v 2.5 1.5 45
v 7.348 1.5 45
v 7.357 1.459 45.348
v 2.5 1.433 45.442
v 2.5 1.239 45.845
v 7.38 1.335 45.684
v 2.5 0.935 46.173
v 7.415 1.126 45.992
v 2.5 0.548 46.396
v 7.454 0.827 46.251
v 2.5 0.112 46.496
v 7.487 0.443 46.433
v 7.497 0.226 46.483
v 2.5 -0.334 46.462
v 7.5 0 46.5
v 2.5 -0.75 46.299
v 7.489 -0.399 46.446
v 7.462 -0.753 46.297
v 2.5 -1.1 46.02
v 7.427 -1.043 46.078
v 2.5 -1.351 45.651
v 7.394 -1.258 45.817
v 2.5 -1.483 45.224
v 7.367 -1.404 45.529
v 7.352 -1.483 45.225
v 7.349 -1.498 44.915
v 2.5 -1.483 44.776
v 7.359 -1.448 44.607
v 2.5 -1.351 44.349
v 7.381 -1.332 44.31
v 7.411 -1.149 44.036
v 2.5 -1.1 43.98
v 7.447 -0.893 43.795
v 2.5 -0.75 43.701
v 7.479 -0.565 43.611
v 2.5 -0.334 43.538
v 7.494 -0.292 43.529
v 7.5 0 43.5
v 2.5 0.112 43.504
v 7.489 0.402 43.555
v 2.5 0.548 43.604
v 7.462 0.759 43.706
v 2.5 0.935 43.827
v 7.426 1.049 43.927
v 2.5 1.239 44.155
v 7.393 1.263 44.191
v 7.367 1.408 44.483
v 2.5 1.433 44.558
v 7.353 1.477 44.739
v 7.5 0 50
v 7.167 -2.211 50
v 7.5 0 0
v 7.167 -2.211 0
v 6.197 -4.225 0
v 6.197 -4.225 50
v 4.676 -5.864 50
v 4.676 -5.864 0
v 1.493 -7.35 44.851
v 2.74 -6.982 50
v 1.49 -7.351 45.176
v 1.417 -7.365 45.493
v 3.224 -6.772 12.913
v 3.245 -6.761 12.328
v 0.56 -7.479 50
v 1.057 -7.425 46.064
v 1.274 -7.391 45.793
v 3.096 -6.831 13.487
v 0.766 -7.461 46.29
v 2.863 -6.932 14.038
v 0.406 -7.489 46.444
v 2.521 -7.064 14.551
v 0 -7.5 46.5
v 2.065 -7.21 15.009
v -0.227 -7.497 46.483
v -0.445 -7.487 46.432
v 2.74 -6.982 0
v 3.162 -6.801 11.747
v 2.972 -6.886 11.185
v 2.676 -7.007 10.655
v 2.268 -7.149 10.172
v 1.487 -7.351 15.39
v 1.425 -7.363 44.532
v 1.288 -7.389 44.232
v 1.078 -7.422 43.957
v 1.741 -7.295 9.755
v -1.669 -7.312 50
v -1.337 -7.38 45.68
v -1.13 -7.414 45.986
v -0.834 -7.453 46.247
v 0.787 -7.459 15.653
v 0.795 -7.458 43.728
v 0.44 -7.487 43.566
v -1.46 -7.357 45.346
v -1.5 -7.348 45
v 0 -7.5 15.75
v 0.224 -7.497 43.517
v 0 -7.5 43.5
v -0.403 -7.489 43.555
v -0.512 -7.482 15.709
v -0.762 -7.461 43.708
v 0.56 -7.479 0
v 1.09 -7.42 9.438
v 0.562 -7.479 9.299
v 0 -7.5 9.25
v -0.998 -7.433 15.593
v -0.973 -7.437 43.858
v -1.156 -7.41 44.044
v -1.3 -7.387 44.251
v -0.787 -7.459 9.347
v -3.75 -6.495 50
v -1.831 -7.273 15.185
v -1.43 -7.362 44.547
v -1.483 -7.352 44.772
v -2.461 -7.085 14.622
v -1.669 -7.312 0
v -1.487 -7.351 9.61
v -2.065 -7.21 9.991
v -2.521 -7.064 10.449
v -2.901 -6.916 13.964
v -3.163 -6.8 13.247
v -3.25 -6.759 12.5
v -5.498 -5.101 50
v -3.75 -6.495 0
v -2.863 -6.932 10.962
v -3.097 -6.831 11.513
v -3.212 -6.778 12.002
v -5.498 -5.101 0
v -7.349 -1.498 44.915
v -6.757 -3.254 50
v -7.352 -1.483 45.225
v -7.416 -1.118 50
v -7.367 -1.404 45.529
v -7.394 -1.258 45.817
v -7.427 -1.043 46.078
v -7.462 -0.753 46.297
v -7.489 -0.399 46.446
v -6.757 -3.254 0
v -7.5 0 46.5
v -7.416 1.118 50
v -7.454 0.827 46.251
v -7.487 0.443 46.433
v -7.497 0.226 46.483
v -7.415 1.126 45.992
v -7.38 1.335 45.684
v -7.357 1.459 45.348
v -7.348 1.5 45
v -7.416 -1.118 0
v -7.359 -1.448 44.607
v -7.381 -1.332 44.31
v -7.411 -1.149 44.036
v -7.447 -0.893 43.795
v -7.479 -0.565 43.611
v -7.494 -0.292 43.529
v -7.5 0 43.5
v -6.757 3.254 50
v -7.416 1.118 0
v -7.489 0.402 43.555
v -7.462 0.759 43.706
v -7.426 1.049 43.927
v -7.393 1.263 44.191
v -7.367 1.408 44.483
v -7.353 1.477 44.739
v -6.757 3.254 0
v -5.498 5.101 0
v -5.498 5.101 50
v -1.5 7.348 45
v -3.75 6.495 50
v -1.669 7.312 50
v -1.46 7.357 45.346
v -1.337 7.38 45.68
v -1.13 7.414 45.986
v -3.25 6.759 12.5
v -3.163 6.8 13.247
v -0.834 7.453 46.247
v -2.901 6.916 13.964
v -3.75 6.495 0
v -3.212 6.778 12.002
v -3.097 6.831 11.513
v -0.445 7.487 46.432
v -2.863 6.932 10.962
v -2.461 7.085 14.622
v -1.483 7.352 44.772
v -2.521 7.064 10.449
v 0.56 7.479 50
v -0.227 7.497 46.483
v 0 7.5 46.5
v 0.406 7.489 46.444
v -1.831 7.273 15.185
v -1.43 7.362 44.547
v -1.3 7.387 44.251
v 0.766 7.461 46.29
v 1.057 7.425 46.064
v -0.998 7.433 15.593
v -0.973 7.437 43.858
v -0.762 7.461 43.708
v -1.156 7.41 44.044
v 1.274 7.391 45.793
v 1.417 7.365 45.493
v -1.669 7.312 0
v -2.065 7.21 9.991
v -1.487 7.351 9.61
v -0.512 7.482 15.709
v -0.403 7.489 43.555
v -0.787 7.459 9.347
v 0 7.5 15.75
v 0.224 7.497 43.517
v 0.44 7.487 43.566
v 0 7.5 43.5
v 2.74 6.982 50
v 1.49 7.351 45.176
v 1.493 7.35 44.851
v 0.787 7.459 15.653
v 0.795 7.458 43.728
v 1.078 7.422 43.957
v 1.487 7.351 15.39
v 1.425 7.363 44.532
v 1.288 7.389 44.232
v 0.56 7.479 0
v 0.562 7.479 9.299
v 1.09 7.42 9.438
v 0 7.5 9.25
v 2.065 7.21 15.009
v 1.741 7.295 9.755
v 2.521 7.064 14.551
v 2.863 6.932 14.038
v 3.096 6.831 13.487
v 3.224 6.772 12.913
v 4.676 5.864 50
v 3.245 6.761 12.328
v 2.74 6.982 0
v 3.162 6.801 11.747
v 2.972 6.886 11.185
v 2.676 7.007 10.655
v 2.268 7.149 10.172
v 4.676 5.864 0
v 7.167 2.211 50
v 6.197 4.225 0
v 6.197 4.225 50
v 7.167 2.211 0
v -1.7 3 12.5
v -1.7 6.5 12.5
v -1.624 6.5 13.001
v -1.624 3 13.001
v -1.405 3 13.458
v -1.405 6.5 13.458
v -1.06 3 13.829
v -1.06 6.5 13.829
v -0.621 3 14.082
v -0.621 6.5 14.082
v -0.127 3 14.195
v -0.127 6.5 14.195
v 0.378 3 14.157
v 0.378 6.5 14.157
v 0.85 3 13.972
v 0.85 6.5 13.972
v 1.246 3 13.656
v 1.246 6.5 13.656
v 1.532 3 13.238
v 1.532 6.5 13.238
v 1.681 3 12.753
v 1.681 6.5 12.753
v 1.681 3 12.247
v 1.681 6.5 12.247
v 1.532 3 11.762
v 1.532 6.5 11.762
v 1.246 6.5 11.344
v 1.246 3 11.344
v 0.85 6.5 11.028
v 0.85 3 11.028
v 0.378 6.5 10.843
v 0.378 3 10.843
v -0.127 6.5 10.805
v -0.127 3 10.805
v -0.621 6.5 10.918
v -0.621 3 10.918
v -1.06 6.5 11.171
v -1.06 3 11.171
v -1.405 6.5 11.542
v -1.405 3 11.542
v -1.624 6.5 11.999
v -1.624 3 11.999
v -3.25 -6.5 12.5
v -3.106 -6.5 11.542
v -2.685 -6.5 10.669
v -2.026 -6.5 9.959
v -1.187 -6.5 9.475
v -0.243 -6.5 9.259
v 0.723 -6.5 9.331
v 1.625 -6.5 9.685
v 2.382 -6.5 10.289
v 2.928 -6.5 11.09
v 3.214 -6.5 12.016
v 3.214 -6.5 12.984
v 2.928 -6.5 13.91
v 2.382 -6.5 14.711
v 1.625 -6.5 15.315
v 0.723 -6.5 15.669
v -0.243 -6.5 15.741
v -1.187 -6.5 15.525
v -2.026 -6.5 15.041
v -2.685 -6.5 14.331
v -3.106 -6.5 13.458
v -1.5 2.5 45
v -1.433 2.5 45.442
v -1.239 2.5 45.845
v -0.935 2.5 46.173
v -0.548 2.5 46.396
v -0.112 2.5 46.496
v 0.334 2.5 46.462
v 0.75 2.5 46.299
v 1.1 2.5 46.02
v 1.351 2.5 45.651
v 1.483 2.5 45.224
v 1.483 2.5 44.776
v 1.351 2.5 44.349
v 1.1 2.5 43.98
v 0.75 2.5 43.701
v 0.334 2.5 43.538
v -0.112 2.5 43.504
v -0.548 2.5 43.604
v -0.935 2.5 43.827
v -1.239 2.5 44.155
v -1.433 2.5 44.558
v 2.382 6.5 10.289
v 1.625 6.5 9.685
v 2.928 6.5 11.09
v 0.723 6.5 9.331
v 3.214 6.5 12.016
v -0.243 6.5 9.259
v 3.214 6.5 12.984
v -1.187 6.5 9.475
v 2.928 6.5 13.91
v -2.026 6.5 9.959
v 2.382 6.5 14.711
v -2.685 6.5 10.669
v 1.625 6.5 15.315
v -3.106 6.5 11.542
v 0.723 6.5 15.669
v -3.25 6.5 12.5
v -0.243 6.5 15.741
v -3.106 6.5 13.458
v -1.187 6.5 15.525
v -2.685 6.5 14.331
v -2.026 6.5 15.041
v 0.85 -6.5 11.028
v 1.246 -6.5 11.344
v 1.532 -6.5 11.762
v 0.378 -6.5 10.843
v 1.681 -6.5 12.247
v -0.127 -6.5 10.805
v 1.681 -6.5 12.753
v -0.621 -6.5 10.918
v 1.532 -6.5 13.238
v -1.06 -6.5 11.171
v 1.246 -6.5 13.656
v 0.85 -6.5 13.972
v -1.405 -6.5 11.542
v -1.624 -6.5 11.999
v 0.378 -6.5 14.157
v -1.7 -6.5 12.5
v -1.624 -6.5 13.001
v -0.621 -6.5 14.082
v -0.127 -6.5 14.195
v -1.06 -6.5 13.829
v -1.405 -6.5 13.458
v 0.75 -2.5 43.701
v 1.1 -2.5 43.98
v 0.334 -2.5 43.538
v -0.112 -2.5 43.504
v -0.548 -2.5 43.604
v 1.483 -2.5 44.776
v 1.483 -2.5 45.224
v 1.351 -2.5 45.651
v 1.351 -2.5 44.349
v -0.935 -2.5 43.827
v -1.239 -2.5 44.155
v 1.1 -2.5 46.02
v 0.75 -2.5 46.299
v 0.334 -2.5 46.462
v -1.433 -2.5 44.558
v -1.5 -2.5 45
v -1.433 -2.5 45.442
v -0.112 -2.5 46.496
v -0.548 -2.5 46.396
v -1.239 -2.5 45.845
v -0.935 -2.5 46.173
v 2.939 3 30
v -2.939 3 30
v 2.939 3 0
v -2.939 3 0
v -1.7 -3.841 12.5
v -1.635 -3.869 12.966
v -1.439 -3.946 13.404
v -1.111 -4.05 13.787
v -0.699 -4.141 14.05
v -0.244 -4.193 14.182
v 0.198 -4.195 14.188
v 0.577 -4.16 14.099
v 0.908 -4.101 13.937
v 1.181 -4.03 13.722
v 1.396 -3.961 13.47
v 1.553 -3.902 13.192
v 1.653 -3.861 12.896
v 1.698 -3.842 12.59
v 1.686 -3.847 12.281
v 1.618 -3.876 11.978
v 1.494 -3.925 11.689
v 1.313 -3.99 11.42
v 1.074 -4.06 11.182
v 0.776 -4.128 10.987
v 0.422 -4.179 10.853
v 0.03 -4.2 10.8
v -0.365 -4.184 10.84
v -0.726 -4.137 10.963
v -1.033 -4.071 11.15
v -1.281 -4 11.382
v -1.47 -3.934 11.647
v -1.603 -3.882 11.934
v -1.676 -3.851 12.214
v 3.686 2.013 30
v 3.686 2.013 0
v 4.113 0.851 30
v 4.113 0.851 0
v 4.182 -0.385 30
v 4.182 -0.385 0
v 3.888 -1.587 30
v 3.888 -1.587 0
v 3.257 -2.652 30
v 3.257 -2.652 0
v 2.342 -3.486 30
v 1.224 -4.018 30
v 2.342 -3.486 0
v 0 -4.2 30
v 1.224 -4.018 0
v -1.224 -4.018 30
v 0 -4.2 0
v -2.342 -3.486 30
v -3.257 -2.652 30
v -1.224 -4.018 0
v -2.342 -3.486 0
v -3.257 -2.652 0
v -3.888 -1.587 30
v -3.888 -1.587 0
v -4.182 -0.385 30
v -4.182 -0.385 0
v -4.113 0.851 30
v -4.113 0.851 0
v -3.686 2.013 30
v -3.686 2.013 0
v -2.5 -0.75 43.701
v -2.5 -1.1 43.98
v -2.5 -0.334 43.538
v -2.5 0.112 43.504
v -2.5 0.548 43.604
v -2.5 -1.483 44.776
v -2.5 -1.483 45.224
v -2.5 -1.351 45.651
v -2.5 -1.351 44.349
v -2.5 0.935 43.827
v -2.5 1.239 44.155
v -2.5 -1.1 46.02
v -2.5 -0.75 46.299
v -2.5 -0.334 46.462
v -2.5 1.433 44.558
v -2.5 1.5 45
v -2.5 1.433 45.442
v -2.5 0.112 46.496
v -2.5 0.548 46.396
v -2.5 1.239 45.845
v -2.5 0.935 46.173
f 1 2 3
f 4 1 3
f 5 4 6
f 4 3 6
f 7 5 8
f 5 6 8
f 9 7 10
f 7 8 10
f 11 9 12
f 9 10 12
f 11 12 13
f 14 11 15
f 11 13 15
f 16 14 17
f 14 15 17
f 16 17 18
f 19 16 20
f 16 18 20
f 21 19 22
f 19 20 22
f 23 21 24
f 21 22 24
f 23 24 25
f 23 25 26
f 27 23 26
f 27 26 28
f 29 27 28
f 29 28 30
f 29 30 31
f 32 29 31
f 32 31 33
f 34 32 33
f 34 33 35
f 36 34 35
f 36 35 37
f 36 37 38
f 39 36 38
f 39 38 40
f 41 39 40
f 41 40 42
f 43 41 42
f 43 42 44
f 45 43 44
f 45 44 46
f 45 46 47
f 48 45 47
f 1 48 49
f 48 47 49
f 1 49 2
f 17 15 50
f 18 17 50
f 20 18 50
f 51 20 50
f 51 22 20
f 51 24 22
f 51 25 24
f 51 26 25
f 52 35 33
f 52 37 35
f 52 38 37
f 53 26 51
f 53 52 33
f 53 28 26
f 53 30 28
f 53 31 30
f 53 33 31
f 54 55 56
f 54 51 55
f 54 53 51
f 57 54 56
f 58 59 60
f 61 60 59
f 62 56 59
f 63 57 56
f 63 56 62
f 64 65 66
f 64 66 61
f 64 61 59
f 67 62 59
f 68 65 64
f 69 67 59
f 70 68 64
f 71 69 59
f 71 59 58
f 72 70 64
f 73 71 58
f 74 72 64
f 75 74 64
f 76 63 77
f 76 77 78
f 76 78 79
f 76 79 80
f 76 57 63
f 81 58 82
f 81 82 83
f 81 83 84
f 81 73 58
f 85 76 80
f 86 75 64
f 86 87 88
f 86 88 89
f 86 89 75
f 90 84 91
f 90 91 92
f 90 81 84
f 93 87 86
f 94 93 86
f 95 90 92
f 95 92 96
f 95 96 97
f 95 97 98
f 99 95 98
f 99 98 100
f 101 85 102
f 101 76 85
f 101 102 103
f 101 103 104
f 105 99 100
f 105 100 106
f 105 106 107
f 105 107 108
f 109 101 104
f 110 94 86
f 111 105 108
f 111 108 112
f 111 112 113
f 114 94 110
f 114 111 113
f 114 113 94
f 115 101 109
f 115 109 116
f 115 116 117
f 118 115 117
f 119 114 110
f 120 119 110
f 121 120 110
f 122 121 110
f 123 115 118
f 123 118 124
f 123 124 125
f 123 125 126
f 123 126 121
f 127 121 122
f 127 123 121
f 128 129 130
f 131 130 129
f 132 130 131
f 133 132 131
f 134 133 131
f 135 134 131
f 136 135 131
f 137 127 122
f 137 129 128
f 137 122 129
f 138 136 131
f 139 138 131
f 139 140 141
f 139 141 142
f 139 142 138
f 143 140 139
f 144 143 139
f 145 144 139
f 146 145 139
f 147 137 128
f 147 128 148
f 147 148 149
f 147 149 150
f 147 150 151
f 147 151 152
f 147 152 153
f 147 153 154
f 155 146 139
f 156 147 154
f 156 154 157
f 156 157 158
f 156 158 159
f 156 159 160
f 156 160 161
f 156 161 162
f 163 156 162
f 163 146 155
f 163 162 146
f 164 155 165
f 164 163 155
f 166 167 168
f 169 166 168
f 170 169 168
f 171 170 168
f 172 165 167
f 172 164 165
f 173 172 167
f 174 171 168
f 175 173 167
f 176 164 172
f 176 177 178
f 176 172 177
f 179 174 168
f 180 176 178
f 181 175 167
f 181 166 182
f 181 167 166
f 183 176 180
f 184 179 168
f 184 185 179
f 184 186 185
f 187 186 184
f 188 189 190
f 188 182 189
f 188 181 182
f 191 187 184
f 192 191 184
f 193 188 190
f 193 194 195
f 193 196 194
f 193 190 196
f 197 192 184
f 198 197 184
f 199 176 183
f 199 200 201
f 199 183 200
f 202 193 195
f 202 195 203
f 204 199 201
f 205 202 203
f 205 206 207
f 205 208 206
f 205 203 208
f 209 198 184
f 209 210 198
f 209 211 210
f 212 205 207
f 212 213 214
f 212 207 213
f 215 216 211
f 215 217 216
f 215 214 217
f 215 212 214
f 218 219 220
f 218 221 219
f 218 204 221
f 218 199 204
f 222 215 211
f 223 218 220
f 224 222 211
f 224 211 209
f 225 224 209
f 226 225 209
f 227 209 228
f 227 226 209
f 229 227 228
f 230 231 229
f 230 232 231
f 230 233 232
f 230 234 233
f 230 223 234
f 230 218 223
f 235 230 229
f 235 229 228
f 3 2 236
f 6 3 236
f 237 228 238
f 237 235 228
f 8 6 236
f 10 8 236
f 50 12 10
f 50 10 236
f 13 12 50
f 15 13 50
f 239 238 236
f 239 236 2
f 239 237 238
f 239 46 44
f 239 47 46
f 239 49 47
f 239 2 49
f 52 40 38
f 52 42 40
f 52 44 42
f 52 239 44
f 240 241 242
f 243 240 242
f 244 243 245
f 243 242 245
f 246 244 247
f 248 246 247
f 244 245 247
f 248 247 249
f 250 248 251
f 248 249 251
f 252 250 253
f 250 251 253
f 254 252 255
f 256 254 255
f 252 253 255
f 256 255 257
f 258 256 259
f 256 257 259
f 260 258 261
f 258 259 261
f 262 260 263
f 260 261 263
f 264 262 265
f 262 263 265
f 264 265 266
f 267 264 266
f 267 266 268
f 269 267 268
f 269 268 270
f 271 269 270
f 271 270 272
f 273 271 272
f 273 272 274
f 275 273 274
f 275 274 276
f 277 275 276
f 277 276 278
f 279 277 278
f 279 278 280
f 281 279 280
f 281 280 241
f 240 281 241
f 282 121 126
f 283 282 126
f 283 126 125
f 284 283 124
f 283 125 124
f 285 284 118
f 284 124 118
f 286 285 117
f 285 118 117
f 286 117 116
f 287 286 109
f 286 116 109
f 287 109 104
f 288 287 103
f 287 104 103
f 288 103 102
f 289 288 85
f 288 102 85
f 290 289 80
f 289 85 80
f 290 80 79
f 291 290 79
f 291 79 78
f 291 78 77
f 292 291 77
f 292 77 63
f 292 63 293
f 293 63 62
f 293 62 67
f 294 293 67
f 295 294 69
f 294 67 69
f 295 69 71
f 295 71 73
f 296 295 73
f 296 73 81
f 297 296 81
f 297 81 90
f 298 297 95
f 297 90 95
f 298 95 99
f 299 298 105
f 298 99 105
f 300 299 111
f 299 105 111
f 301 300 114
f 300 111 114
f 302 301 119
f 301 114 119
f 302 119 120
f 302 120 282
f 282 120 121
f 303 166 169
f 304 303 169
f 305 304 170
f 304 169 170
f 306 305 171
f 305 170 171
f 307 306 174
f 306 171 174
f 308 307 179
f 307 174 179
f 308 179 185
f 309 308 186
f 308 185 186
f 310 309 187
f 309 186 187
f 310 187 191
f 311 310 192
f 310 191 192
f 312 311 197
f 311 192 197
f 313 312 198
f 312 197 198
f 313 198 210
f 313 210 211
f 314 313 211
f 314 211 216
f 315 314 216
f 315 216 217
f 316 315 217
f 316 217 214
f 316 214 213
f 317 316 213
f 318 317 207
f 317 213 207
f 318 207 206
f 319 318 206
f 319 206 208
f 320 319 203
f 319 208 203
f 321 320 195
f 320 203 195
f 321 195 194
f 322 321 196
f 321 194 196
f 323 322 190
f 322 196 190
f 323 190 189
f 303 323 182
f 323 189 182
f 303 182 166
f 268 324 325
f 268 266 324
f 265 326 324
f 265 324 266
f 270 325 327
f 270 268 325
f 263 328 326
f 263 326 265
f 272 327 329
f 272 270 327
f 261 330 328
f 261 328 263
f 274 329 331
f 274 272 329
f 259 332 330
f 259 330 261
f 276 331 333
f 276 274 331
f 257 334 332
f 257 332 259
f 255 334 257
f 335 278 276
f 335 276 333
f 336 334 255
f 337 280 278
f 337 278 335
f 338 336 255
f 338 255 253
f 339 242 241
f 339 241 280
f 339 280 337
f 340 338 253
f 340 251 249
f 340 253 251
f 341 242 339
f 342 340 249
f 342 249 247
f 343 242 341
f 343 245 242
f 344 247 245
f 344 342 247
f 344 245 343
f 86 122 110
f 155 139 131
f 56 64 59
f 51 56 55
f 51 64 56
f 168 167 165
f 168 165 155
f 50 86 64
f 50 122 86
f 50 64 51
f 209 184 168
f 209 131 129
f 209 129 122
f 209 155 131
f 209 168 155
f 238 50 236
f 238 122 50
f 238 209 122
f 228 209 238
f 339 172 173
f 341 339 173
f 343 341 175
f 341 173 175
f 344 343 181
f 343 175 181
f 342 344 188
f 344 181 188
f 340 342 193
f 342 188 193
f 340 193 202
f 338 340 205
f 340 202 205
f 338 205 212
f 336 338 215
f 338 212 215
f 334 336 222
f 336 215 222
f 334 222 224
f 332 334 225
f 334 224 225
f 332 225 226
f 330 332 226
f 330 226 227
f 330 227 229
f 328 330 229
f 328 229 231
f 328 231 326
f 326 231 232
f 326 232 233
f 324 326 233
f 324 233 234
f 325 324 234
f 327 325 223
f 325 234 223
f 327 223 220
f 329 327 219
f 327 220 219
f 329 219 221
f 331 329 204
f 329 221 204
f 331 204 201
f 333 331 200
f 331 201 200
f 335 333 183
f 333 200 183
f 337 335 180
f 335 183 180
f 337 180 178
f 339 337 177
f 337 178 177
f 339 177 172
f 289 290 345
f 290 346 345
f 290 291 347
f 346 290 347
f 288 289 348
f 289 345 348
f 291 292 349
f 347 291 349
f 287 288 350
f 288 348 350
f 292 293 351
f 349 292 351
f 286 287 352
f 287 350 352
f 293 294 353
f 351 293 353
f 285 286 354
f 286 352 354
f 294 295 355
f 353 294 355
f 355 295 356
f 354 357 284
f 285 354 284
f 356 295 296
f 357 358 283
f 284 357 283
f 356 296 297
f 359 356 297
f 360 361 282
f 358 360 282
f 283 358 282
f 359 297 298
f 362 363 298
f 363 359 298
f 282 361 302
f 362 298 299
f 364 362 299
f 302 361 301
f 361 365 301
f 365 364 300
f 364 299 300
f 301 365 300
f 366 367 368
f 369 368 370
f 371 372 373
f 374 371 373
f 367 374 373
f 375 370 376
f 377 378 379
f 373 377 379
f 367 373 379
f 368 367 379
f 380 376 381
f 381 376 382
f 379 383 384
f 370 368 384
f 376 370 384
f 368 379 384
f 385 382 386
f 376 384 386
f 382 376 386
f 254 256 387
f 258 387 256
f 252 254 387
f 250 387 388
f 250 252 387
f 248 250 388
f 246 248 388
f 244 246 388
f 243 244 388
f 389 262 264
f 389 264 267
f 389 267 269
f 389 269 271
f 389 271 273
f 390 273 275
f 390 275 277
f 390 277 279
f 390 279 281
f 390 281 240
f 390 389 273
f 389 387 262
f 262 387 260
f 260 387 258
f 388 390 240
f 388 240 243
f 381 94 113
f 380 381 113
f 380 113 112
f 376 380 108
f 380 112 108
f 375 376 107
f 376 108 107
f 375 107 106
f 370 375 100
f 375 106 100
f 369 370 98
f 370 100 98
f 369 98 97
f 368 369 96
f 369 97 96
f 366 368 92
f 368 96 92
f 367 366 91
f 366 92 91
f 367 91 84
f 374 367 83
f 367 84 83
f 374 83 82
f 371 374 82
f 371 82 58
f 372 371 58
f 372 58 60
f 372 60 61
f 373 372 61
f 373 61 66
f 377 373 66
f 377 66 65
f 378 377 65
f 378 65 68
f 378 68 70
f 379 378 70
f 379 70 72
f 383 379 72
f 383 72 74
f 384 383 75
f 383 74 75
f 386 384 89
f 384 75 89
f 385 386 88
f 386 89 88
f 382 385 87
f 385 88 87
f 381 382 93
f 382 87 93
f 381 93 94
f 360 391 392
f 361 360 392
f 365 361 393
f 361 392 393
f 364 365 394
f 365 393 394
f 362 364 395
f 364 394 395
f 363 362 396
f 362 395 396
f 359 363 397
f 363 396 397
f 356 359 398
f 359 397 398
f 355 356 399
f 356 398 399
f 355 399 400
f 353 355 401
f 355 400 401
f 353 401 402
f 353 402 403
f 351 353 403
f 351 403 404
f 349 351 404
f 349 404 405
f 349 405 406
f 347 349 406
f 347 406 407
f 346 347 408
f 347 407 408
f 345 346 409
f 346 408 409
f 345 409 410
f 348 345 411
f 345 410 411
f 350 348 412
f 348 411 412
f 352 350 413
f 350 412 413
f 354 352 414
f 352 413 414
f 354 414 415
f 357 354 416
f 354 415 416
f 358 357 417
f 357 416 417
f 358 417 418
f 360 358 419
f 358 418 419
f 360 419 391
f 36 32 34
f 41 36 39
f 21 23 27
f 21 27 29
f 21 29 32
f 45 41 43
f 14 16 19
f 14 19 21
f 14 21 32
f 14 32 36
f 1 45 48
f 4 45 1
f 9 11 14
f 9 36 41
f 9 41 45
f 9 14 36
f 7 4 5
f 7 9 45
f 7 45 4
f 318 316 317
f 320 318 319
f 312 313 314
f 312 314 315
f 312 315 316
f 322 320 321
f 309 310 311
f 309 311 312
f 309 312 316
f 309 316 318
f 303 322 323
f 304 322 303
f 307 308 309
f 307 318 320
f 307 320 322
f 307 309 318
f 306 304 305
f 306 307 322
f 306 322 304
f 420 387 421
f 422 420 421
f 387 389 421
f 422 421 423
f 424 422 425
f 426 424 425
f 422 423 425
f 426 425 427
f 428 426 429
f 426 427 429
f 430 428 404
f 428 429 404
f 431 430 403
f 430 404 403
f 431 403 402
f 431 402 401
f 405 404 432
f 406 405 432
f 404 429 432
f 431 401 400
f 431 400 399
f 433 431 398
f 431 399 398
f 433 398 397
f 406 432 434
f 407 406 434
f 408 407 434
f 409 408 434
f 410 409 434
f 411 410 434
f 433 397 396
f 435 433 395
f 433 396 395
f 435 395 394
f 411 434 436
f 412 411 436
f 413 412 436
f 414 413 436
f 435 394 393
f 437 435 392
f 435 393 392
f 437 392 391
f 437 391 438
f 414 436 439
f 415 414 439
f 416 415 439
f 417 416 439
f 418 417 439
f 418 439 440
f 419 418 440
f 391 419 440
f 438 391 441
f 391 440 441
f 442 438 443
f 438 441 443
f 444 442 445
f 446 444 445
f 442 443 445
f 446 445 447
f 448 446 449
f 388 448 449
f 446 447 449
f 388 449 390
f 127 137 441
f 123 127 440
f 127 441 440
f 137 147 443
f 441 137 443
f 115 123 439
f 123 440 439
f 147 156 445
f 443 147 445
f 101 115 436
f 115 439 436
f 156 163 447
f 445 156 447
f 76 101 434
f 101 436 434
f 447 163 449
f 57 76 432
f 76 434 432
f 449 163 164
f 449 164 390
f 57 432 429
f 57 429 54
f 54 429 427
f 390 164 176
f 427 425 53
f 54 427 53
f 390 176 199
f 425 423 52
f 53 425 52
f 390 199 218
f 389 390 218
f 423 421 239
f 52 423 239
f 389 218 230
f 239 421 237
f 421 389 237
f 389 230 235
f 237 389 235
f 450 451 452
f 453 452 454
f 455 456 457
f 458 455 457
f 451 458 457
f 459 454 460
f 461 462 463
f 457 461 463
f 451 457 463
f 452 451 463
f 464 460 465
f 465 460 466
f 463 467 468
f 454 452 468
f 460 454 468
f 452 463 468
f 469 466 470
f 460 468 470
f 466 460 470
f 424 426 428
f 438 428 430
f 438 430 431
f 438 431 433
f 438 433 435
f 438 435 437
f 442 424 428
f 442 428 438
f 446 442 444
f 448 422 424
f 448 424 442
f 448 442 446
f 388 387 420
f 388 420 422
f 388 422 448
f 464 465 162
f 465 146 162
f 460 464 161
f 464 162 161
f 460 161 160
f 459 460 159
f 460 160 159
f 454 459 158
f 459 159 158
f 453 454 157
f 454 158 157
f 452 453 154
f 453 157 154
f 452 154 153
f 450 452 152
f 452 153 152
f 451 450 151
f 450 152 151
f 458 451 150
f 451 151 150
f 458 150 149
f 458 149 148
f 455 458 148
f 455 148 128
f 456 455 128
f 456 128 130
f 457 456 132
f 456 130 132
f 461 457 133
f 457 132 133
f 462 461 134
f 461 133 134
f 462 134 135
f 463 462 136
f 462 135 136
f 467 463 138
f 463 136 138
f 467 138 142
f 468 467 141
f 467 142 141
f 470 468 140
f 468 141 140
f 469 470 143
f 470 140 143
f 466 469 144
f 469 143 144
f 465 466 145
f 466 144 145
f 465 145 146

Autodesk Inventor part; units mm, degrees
sketch "スケッチ1" plane through (0, 0, 0) normal (0, 0, 1) x (1, 0, 0)
  circle A0 centre (0, 0) radius 7.5
  dimension "d0" = 15
extrude "押し出し1" add sketch "スケッチ1" along normal blind 50
sketch "スケッチ2" plane through (0, 0, 0) normal (0, 0, -1) x (-1, 0, 0)
  arc A0 (-2.9394, 3) -> (2.9394, 3) centre (0, 0) ccw
  line L0 (-2.9394, 3) -> (2.9394, 3)
  point P0 (-3.1305, 2.8)
  dimension "d3" = 4.2
  dimension "d4" = 3
extrude "押し出し2" cut sketch "スケッチ2" against normal blind 30
ref_plane "作業平面1" through (7.5, 0, 0) normal (1, 0, 0) x (0, 1, 0)
ref_plane "作業平面2" through (-7.5, 0, 0) normal (1, 0, 0) x (0, 1, 0)
ref_plane "作業平面3" through (0, 7.5, 0) normal (0, 1, 0) x (-1, 0, 0)
ref_plane "作業平面4" through (0, -7.5, 0) normal (0, 1, 0) x (-1, 0, 0)
sketch "スケッチ3" plane through (7.5, 0, 0) normal (1, 0, 0) x (0, 1, 0)
  circle A0 centre (0, 45) radius 1.5
  line L0 (7.5, 50) -> (-7.5, 50) projected
  point P0 (0, 0)
  dimension "d11" = 3
  dimension "d12" = 5
sketch "スケッチ4" plane through (-7.5, 0, 0) normal (1, 0, 0) x (0, 1, 0)
  circle A0 centre (0, 45) radius 1.5
  line L0 (7.5, 50) -> (-7.5, 50) projected
  point P0 (0, 0)
  dimension "d13" = 3
  dimension "d14" = 5
extrude "押し出し3" cut sketch "スケッチ3" against normal blind 5
extrude "押し出し4" cut sketch "スケッチ4" along normal blind 5
sketch "スケッチ5" plane through (0, 7.5, 0) normal (0, 1, 0) x (-1, 0, 0)
  circle A0 centre (0, 45) radius 1.5
  line L0 (7.5, 50) -> (-7.5, 50) projected
  point P0 (0, 0)
  dimension "d19" = 3
  dimension "d20" = 5
sketch "スケッチ6" plane through (0, -7.5, 0) normal (0, 1, 0) x (-1, 0, 0)
  circle A0 centre (0, 45) radius 1.5
  line L0 (7.5, 50) -> (-7.5, 50) projected
  point P0 (0, 0)
  dimension "d21" = 3
  dimension "d22" = 5
extrude "押し出し5" cut sketch "スケッチ5" against normal blind 5
extrude "押し出し6" cut sketch "スケッチ6" along normal blind 5
thread "ねじ1" size "M3x0.5" class "6H" standard "ANSI Metric M Profile" full length
thread "ねじ2" size "M3x0.5" class "6H" standard "ANSI Metric M Profile" full length
thread "ねじ3" size "M3x0.5" class "6H" standard "ANSI Metric M Profile" full length
thread "ねじ4" size "M3x0.5" class "6H" standard "ANSI Metric M Profile" full length
sketch "スケッチ7" plane through (0, 7.5, 0) normal (0, 1, 0) x (-1, 0, 0)
  circle A0 centre (0, 12.5) radius 1.7
  point P0 (0, 0)
  dimension "d35" = 3.4
  dimension "d36" = 12.5
extrude "押し出し7" cut sketch "スケッチ7" against normal through all
sketch "スケッチ8" plane through (0, 7.5, 0) normal (0, 1, 0) x (-1, 0, 0)
  circle A0 centre (0, 12.5) radius 3.25
  point P0 (0, 0)
  dimension "d39" = 6.5
  dimension "d40" = 12.5
sketch "スケッチ9" plane through (0, -7.5, 0) normal (0, 1, 0) x (-1, 0, 0)
  circle A0 centre (0, 12.5) radius 3.25
  point P0 (0, 0)
  dimension "d41" = 6.5
  dimension "d42" = 12.5
extrude "押し出し8" cut sketch "スケッチ8" against normal blind 1
extrude "押し出し9" cut sketch "スケッチ9" along normal blind 1
properties part number "rotary_transfer_shaft_5" material "ステンレス鋼"
